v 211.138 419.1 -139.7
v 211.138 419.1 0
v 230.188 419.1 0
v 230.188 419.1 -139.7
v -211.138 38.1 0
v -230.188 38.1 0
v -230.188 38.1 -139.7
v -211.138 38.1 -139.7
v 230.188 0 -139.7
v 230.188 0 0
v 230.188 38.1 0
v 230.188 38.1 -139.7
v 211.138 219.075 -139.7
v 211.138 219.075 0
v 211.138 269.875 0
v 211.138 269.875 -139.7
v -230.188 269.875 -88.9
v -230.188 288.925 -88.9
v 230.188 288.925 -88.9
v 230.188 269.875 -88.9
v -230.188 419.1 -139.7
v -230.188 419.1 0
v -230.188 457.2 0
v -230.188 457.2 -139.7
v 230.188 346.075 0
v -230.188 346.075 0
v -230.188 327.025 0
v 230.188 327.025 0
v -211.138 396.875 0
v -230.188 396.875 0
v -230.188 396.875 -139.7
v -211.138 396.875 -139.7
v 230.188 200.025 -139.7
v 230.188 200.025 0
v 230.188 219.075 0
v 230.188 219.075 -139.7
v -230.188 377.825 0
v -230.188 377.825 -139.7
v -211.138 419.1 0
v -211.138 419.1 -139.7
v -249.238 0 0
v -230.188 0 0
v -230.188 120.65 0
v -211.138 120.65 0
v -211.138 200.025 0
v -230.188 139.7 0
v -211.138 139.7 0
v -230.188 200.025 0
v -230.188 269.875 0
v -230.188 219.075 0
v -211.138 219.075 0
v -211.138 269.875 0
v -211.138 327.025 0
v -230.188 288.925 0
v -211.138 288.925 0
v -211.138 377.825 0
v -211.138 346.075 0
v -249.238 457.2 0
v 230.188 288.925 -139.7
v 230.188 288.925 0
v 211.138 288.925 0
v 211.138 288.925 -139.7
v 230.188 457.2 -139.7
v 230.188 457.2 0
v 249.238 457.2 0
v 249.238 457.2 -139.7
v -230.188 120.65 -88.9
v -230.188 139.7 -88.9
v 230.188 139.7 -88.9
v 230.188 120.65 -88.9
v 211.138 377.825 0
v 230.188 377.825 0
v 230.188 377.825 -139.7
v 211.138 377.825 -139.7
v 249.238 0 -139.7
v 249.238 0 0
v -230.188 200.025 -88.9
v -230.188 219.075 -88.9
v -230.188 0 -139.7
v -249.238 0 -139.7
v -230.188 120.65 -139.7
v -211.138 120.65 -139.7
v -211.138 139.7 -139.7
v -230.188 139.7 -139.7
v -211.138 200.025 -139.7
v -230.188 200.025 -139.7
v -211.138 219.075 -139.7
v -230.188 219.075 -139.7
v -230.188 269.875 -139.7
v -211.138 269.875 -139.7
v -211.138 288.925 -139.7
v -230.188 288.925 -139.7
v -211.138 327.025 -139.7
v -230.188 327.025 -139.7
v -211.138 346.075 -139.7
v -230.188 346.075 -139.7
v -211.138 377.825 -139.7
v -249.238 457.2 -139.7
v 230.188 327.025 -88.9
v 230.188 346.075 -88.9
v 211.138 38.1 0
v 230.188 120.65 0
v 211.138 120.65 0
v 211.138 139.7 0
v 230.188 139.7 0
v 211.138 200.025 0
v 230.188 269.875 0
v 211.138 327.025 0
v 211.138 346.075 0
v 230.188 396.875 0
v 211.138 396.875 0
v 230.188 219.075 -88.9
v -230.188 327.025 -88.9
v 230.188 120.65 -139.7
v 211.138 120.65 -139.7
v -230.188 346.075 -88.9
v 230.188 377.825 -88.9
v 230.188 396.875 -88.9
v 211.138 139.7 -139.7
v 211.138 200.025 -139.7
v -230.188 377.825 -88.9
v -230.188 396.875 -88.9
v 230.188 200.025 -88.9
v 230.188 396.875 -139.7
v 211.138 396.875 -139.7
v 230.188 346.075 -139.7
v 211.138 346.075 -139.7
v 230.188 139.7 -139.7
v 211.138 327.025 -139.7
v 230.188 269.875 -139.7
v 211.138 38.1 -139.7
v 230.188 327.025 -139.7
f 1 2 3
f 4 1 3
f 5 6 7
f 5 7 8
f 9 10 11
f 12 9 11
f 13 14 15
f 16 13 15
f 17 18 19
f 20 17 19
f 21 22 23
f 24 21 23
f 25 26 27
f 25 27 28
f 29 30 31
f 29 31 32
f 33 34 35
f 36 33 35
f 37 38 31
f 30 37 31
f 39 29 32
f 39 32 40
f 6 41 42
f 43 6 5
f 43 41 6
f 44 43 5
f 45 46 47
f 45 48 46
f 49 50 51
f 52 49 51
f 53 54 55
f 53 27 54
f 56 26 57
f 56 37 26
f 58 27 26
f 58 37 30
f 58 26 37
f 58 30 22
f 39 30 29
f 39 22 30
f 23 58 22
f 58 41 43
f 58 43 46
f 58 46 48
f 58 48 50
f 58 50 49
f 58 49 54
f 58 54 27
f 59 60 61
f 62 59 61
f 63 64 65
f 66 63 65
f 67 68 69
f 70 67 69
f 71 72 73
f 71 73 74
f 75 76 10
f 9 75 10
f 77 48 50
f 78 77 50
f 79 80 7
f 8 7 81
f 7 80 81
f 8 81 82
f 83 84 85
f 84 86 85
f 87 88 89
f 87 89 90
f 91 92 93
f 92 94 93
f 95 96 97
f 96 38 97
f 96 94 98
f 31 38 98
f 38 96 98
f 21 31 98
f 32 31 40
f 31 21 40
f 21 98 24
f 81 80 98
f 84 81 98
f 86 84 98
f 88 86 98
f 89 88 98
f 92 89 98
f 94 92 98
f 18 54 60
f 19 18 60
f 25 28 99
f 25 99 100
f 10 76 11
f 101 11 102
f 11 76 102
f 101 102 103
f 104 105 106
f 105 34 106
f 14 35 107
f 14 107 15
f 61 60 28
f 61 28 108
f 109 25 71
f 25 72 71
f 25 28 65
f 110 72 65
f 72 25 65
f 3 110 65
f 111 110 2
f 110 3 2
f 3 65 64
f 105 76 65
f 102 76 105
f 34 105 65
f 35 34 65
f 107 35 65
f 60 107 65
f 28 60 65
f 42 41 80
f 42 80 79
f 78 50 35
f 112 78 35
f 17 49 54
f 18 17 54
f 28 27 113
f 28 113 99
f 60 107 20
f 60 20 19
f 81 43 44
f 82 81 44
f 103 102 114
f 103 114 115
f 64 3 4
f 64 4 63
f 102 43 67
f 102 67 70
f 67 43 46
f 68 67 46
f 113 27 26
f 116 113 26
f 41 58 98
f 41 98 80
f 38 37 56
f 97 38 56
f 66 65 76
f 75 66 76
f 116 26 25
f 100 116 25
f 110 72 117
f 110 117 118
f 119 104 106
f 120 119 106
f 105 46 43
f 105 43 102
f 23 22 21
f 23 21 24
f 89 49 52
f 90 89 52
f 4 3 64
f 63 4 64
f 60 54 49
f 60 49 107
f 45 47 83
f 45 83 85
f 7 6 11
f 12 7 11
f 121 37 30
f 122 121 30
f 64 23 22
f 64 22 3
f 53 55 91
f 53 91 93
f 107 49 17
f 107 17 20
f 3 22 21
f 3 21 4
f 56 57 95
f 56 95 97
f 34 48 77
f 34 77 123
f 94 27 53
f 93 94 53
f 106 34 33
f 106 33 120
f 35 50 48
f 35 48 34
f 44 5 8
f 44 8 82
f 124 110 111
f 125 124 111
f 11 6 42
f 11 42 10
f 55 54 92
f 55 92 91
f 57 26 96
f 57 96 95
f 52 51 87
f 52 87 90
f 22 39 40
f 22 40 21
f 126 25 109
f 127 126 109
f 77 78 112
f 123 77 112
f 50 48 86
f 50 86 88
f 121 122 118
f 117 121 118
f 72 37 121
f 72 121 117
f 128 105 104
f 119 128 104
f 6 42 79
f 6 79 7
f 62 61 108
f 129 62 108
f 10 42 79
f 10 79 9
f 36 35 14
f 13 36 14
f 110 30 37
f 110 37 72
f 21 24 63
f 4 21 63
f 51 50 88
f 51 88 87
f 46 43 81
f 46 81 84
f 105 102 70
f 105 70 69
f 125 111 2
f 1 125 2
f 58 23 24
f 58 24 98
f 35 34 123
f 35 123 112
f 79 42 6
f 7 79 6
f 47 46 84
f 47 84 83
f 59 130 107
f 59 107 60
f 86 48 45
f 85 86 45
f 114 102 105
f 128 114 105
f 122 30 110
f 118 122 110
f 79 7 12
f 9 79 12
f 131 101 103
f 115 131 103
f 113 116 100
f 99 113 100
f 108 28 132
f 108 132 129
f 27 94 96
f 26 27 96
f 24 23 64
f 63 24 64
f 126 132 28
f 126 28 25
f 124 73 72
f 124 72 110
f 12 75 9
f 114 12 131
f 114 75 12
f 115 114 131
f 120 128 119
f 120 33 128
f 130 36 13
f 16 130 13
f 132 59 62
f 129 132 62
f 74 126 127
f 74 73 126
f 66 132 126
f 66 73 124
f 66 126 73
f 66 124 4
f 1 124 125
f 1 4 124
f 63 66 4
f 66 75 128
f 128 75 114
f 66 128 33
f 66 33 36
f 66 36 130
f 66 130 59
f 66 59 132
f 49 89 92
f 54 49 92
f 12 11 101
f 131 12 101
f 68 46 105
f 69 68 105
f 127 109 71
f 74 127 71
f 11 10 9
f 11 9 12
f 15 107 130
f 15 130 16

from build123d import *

# Parameters (mm, degrees)
F1_DEPTH = 139.7
F2_W     = 19.05
F2_H     = 19.05
F3_DEPTH = 139.7
F5_W     = 460.375
F5_H     = 38.1
F6_DEPTH = 139.7
F7_W     = 460.375
F7_H     = 19.05
F8_DEPTH = 88.9


with BuildPart() as f1:
    # F0 (on Top) → F1 (new body)
    with BuildSketch(Plane.XY):
        Polygon((-249.2375, 0), (-230.1875, 0), (-230.1875, 38.1), (-211.1375, 38.1), (-211.1375, 419.1), (-230.1875, 419.1), (-230.1875, 457.2), (-249.2375, 457.2), align=None)
    extrude(amount=-F1_DEPTH)

    # F2 (on face) → F3 (cut, through all)
    with BuildSketch(Plane.XY):
        with Locations((-220.6625, 130.175)):
            Rectangle(F2_W, F2_H)
        with Locations((-220.6625, 209.55)):
            Rectangle(F2_W, F2_H)
        with Locations((-220.6625, 279.4)):
            Rectangle(F2_W, F2_H)
        with Locations((-220.6625, 336.55)):
            Rectangle(F2_W, F2_H)
        with Locations((-220.6625, 387.35)):
            Rectangle(F2_W, F2_H)
    extrude(amount=-F3_DEPTH, mode=Mode.SUBTRACT)


with BuildPart() as f4_1:
    # F4: instance of F1
    add(f1.part.mirror(Plane.YZ))


with BuildPart() as f6:
    # F5 (on face) → F6 (new body)
    with BuildSketch(Plane.XY):
        with Locations((0, 19.05)):
            Rectangle(F5_W, F5_H)
        with Locations((0, 438.15)):
            Rectangle(F5_W, F5_H)
    extrude(amount=-F6_DEPTH)


with BuildPart() as f8:
    # F7 (on face) → F8 (new body)
    with BuildSketch(Plane.XY):
        with Locations((0, 130.175)):
            Rectangle(F7_W, F7_H)
        with Locations((0, 209.55)):
            Rectangle(F7_W, F7_H)
        with Locations((0, 279.4)):
            Rectangle(F7_W, F7_H)
        with Locations((0, 336.55)):
            Rectangle(F7_W, F7_H)
        with Locations((0, 387.35)):
            Rectangle(F7_W, F7_H)
    extrude(amount=-F8_DEPTH)


solid = Compound([f1.part, f4_1.part, f6.part, f8.part])
